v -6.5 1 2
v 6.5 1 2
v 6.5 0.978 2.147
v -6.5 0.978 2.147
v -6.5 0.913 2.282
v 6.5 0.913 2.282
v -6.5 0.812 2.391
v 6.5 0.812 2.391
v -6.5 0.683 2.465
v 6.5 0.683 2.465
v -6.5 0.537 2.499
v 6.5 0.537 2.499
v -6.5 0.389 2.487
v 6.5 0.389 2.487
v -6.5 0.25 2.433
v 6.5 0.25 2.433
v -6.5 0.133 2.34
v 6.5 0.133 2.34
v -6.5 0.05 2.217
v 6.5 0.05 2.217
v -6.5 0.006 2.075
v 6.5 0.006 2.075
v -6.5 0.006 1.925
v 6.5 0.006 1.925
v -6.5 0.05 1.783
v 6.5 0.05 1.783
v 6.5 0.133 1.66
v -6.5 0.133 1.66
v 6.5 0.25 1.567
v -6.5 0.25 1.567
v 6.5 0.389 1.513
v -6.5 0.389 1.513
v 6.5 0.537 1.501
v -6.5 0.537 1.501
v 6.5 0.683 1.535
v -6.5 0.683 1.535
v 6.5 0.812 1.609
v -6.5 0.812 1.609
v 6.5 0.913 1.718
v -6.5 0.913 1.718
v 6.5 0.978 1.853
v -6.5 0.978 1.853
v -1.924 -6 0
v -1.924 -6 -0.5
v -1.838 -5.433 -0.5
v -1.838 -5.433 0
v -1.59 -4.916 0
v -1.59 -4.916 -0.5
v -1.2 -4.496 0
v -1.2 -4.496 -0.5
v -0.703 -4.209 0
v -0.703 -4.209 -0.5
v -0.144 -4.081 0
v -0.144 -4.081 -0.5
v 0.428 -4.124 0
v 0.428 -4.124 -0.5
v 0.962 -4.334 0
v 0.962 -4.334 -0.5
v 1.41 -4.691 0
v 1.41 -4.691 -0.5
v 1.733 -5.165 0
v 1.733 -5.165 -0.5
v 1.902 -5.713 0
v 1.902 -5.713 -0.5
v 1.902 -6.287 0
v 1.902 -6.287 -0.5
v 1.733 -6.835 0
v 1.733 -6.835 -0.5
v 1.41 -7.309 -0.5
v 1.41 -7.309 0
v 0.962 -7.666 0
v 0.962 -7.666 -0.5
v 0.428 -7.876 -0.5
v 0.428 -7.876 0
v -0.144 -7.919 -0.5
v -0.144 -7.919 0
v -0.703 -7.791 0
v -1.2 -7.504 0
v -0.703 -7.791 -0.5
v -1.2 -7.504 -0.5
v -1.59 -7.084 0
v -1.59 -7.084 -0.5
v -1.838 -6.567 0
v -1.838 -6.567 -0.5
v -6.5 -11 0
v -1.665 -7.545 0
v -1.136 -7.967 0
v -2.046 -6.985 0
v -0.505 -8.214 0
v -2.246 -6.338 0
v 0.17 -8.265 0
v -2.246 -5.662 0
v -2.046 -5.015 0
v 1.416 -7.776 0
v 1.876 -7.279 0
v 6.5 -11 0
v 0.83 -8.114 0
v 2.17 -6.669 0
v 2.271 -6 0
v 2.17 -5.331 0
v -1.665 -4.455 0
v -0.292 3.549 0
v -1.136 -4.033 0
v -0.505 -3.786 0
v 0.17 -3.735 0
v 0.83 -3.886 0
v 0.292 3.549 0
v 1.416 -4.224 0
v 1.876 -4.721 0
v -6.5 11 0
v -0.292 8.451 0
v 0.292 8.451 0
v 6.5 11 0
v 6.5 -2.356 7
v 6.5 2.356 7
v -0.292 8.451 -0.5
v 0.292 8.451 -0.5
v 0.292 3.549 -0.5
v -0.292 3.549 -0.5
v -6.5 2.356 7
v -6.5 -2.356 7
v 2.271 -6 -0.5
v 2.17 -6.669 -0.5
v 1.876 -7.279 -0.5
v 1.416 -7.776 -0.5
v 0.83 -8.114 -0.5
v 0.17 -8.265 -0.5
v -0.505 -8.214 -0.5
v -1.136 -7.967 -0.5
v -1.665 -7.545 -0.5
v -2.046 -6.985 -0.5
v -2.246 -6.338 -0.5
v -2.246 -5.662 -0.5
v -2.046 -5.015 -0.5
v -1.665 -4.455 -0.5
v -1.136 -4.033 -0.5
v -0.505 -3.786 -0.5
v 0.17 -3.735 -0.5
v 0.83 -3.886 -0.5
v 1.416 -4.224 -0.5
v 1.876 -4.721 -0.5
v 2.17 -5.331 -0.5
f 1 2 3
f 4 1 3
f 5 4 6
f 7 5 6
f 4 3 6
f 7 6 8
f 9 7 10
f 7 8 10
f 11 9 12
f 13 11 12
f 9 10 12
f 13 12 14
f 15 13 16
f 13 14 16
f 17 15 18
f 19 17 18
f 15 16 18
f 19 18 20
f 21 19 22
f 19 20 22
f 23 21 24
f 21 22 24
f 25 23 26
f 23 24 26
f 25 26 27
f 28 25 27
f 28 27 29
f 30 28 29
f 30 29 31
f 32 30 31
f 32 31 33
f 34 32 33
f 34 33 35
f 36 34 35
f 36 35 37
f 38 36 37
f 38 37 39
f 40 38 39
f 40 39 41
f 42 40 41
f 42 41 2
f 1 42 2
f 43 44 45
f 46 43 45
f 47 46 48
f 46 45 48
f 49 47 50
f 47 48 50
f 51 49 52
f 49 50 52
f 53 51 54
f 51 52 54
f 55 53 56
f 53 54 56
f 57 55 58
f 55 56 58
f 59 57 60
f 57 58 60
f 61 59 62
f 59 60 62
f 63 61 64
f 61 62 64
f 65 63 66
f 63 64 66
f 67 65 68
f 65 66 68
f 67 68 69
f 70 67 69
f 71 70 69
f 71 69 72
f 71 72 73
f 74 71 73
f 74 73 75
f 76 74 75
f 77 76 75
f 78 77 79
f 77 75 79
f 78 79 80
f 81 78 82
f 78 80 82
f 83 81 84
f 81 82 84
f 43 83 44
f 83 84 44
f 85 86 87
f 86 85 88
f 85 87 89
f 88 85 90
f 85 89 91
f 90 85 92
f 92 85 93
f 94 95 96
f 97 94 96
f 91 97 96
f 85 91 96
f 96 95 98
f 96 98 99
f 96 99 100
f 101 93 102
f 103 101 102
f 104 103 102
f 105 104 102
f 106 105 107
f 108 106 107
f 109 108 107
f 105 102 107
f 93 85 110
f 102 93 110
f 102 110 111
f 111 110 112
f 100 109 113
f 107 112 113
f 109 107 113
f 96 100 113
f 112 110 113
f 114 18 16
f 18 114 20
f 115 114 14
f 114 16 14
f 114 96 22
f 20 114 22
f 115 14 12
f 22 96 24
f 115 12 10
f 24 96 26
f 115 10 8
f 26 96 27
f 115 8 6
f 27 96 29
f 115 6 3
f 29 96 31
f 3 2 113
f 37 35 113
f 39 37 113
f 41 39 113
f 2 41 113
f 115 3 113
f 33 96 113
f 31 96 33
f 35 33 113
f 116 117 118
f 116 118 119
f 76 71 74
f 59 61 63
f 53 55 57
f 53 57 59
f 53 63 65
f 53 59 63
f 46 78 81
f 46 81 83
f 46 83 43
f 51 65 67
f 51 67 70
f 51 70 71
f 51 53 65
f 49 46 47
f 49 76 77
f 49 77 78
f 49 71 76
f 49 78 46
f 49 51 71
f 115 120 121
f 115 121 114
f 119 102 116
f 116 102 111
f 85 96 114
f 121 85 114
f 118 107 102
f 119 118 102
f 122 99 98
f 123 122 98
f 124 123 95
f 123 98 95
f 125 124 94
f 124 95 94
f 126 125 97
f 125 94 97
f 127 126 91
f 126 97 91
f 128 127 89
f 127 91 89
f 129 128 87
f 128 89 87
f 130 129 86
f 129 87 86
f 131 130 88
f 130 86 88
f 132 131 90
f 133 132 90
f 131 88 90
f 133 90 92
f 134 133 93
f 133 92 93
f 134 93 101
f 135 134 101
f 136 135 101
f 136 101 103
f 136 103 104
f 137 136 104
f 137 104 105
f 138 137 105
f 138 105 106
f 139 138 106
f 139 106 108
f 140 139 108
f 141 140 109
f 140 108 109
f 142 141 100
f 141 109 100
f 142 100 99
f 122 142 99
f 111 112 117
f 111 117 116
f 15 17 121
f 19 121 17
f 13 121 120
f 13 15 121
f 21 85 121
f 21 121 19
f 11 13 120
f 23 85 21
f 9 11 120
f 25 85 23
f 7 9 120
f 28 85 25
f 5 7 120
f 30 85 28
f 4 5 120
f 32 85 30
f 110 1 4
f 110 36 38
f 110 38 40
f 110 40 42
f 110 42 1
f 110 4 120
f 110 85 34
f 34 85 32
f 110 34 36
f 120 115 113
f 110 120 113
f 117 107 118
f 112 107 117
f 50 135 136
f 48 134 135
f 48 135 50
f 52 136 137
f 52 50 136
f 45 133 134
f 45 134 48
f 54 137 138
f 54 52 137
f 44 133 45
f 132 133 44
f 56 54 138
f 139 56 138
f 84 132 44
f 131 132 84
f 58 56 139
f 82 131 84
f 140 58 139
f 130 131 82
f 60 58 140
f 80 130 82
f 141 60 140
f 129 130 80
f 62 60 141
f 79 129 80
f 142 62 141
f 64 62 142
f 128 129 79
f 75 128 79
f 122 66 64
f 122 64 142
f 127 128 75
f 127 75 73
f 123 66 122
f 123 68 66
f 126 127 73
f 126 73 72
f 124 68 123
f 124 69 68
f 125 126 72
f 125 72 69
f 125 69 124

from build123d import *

# Parameters (mm, degrees)
IZIM1_W                     = 13
IZIM1_H                     = 22
Y_KSEKLIK_EKSTR_ZYON1_DEPTH = 7
KES_EKSTR_ZYON1_DEPTH       = 19.41195264
IZIM3_W                     = 0.583664442
IZIM3_H                     = 4.902781318
IZIM3_R                     = 2.271047272
Y_KSEKLIK_EKSTR_ZYON2_DEPTH = 0.5
IZIM4_R                     = 1.923937322
KES_EKSTR_ZYON2_DEPTH       = 0.5
IZIM5_R                     = 0.5
KES_EKSTR_ZYON3_DEPTH       = 19.41195264


with BuildPart() as part:
    # Çizim1 → Yükseklik-Ekstrüzyon1 (new body)
    with BuildSketch(Plane.XY):
        Rectangle(IZIM1_W, IZIM1_H)
    extrude(amount=Y_KSEKLIK_EKSTR_ZYON1_DEPTH)

    # Çizim2 → Kes-Ekstrüzyon1 (cut, through all)
    with BuildSketch(Plane(origin=(6.5, 0, 0), x_dir=(0, 0, -1), z_dir=(1, 0, 0))):
        Polygon((-7, 2.355719904), (0, 11), (-7, 11), align=None)
        Polygon((0, -11), (-7, -2.355719904), (-7, -11), align=None)
    extrude(amount=-KES_EKSTR_ZYON1_DEPTH, mode=Mode.SUBTRACT)

    # Çizim3 → Yükseklik-Ekstrüzyon2 (add)
    with BuildSketch(Plane(origin=(0, 0, 0), x_dir=(-1, 0, 0), z_dir=(0, 0, -1))):
        with Locations((0, 6)):
            Rectangle(IZIM3_W, IZIM3_H)
        with Locations(Location((0, -6, 0), (0, 0, 180))):
            Circle(IZIM3_R)
    extrude(amount=Y_KSEKLIK_EKSTR_ZYON2_DEPTH)

    # Çizim4 → Kes-Ekstrüzyon2 (cut)
    with BuildSketch(Plane(origin=(0, 0, -0.5), x_dir=(-1, 0, 0), z_dir=(0, 0, -1))):
        with Locations((0, -6)):
            Circle(IZIM4_R)
    extrude(amount=-KES_EKSTR_ZYON2_DEPTH, mode=Mode.SUBTRACT)

    # Çizim5 → Kes-Ekstrüzyon3 (cut, through all)
    with BuildSketch(Plane(origin=(6.5, 0, 0), x_dir=(0, 0, -1), z_dir=(1, 0, 0))):
        with Locations(Location((-2, 0.5, 0), (0, 0, 90))):
            Circle(IZIM5_R)
    extrude(amount=-KES_EKSTR_ZYON3_DEPTH, mode=Mode.SUBTRACT)


solid = part.part
